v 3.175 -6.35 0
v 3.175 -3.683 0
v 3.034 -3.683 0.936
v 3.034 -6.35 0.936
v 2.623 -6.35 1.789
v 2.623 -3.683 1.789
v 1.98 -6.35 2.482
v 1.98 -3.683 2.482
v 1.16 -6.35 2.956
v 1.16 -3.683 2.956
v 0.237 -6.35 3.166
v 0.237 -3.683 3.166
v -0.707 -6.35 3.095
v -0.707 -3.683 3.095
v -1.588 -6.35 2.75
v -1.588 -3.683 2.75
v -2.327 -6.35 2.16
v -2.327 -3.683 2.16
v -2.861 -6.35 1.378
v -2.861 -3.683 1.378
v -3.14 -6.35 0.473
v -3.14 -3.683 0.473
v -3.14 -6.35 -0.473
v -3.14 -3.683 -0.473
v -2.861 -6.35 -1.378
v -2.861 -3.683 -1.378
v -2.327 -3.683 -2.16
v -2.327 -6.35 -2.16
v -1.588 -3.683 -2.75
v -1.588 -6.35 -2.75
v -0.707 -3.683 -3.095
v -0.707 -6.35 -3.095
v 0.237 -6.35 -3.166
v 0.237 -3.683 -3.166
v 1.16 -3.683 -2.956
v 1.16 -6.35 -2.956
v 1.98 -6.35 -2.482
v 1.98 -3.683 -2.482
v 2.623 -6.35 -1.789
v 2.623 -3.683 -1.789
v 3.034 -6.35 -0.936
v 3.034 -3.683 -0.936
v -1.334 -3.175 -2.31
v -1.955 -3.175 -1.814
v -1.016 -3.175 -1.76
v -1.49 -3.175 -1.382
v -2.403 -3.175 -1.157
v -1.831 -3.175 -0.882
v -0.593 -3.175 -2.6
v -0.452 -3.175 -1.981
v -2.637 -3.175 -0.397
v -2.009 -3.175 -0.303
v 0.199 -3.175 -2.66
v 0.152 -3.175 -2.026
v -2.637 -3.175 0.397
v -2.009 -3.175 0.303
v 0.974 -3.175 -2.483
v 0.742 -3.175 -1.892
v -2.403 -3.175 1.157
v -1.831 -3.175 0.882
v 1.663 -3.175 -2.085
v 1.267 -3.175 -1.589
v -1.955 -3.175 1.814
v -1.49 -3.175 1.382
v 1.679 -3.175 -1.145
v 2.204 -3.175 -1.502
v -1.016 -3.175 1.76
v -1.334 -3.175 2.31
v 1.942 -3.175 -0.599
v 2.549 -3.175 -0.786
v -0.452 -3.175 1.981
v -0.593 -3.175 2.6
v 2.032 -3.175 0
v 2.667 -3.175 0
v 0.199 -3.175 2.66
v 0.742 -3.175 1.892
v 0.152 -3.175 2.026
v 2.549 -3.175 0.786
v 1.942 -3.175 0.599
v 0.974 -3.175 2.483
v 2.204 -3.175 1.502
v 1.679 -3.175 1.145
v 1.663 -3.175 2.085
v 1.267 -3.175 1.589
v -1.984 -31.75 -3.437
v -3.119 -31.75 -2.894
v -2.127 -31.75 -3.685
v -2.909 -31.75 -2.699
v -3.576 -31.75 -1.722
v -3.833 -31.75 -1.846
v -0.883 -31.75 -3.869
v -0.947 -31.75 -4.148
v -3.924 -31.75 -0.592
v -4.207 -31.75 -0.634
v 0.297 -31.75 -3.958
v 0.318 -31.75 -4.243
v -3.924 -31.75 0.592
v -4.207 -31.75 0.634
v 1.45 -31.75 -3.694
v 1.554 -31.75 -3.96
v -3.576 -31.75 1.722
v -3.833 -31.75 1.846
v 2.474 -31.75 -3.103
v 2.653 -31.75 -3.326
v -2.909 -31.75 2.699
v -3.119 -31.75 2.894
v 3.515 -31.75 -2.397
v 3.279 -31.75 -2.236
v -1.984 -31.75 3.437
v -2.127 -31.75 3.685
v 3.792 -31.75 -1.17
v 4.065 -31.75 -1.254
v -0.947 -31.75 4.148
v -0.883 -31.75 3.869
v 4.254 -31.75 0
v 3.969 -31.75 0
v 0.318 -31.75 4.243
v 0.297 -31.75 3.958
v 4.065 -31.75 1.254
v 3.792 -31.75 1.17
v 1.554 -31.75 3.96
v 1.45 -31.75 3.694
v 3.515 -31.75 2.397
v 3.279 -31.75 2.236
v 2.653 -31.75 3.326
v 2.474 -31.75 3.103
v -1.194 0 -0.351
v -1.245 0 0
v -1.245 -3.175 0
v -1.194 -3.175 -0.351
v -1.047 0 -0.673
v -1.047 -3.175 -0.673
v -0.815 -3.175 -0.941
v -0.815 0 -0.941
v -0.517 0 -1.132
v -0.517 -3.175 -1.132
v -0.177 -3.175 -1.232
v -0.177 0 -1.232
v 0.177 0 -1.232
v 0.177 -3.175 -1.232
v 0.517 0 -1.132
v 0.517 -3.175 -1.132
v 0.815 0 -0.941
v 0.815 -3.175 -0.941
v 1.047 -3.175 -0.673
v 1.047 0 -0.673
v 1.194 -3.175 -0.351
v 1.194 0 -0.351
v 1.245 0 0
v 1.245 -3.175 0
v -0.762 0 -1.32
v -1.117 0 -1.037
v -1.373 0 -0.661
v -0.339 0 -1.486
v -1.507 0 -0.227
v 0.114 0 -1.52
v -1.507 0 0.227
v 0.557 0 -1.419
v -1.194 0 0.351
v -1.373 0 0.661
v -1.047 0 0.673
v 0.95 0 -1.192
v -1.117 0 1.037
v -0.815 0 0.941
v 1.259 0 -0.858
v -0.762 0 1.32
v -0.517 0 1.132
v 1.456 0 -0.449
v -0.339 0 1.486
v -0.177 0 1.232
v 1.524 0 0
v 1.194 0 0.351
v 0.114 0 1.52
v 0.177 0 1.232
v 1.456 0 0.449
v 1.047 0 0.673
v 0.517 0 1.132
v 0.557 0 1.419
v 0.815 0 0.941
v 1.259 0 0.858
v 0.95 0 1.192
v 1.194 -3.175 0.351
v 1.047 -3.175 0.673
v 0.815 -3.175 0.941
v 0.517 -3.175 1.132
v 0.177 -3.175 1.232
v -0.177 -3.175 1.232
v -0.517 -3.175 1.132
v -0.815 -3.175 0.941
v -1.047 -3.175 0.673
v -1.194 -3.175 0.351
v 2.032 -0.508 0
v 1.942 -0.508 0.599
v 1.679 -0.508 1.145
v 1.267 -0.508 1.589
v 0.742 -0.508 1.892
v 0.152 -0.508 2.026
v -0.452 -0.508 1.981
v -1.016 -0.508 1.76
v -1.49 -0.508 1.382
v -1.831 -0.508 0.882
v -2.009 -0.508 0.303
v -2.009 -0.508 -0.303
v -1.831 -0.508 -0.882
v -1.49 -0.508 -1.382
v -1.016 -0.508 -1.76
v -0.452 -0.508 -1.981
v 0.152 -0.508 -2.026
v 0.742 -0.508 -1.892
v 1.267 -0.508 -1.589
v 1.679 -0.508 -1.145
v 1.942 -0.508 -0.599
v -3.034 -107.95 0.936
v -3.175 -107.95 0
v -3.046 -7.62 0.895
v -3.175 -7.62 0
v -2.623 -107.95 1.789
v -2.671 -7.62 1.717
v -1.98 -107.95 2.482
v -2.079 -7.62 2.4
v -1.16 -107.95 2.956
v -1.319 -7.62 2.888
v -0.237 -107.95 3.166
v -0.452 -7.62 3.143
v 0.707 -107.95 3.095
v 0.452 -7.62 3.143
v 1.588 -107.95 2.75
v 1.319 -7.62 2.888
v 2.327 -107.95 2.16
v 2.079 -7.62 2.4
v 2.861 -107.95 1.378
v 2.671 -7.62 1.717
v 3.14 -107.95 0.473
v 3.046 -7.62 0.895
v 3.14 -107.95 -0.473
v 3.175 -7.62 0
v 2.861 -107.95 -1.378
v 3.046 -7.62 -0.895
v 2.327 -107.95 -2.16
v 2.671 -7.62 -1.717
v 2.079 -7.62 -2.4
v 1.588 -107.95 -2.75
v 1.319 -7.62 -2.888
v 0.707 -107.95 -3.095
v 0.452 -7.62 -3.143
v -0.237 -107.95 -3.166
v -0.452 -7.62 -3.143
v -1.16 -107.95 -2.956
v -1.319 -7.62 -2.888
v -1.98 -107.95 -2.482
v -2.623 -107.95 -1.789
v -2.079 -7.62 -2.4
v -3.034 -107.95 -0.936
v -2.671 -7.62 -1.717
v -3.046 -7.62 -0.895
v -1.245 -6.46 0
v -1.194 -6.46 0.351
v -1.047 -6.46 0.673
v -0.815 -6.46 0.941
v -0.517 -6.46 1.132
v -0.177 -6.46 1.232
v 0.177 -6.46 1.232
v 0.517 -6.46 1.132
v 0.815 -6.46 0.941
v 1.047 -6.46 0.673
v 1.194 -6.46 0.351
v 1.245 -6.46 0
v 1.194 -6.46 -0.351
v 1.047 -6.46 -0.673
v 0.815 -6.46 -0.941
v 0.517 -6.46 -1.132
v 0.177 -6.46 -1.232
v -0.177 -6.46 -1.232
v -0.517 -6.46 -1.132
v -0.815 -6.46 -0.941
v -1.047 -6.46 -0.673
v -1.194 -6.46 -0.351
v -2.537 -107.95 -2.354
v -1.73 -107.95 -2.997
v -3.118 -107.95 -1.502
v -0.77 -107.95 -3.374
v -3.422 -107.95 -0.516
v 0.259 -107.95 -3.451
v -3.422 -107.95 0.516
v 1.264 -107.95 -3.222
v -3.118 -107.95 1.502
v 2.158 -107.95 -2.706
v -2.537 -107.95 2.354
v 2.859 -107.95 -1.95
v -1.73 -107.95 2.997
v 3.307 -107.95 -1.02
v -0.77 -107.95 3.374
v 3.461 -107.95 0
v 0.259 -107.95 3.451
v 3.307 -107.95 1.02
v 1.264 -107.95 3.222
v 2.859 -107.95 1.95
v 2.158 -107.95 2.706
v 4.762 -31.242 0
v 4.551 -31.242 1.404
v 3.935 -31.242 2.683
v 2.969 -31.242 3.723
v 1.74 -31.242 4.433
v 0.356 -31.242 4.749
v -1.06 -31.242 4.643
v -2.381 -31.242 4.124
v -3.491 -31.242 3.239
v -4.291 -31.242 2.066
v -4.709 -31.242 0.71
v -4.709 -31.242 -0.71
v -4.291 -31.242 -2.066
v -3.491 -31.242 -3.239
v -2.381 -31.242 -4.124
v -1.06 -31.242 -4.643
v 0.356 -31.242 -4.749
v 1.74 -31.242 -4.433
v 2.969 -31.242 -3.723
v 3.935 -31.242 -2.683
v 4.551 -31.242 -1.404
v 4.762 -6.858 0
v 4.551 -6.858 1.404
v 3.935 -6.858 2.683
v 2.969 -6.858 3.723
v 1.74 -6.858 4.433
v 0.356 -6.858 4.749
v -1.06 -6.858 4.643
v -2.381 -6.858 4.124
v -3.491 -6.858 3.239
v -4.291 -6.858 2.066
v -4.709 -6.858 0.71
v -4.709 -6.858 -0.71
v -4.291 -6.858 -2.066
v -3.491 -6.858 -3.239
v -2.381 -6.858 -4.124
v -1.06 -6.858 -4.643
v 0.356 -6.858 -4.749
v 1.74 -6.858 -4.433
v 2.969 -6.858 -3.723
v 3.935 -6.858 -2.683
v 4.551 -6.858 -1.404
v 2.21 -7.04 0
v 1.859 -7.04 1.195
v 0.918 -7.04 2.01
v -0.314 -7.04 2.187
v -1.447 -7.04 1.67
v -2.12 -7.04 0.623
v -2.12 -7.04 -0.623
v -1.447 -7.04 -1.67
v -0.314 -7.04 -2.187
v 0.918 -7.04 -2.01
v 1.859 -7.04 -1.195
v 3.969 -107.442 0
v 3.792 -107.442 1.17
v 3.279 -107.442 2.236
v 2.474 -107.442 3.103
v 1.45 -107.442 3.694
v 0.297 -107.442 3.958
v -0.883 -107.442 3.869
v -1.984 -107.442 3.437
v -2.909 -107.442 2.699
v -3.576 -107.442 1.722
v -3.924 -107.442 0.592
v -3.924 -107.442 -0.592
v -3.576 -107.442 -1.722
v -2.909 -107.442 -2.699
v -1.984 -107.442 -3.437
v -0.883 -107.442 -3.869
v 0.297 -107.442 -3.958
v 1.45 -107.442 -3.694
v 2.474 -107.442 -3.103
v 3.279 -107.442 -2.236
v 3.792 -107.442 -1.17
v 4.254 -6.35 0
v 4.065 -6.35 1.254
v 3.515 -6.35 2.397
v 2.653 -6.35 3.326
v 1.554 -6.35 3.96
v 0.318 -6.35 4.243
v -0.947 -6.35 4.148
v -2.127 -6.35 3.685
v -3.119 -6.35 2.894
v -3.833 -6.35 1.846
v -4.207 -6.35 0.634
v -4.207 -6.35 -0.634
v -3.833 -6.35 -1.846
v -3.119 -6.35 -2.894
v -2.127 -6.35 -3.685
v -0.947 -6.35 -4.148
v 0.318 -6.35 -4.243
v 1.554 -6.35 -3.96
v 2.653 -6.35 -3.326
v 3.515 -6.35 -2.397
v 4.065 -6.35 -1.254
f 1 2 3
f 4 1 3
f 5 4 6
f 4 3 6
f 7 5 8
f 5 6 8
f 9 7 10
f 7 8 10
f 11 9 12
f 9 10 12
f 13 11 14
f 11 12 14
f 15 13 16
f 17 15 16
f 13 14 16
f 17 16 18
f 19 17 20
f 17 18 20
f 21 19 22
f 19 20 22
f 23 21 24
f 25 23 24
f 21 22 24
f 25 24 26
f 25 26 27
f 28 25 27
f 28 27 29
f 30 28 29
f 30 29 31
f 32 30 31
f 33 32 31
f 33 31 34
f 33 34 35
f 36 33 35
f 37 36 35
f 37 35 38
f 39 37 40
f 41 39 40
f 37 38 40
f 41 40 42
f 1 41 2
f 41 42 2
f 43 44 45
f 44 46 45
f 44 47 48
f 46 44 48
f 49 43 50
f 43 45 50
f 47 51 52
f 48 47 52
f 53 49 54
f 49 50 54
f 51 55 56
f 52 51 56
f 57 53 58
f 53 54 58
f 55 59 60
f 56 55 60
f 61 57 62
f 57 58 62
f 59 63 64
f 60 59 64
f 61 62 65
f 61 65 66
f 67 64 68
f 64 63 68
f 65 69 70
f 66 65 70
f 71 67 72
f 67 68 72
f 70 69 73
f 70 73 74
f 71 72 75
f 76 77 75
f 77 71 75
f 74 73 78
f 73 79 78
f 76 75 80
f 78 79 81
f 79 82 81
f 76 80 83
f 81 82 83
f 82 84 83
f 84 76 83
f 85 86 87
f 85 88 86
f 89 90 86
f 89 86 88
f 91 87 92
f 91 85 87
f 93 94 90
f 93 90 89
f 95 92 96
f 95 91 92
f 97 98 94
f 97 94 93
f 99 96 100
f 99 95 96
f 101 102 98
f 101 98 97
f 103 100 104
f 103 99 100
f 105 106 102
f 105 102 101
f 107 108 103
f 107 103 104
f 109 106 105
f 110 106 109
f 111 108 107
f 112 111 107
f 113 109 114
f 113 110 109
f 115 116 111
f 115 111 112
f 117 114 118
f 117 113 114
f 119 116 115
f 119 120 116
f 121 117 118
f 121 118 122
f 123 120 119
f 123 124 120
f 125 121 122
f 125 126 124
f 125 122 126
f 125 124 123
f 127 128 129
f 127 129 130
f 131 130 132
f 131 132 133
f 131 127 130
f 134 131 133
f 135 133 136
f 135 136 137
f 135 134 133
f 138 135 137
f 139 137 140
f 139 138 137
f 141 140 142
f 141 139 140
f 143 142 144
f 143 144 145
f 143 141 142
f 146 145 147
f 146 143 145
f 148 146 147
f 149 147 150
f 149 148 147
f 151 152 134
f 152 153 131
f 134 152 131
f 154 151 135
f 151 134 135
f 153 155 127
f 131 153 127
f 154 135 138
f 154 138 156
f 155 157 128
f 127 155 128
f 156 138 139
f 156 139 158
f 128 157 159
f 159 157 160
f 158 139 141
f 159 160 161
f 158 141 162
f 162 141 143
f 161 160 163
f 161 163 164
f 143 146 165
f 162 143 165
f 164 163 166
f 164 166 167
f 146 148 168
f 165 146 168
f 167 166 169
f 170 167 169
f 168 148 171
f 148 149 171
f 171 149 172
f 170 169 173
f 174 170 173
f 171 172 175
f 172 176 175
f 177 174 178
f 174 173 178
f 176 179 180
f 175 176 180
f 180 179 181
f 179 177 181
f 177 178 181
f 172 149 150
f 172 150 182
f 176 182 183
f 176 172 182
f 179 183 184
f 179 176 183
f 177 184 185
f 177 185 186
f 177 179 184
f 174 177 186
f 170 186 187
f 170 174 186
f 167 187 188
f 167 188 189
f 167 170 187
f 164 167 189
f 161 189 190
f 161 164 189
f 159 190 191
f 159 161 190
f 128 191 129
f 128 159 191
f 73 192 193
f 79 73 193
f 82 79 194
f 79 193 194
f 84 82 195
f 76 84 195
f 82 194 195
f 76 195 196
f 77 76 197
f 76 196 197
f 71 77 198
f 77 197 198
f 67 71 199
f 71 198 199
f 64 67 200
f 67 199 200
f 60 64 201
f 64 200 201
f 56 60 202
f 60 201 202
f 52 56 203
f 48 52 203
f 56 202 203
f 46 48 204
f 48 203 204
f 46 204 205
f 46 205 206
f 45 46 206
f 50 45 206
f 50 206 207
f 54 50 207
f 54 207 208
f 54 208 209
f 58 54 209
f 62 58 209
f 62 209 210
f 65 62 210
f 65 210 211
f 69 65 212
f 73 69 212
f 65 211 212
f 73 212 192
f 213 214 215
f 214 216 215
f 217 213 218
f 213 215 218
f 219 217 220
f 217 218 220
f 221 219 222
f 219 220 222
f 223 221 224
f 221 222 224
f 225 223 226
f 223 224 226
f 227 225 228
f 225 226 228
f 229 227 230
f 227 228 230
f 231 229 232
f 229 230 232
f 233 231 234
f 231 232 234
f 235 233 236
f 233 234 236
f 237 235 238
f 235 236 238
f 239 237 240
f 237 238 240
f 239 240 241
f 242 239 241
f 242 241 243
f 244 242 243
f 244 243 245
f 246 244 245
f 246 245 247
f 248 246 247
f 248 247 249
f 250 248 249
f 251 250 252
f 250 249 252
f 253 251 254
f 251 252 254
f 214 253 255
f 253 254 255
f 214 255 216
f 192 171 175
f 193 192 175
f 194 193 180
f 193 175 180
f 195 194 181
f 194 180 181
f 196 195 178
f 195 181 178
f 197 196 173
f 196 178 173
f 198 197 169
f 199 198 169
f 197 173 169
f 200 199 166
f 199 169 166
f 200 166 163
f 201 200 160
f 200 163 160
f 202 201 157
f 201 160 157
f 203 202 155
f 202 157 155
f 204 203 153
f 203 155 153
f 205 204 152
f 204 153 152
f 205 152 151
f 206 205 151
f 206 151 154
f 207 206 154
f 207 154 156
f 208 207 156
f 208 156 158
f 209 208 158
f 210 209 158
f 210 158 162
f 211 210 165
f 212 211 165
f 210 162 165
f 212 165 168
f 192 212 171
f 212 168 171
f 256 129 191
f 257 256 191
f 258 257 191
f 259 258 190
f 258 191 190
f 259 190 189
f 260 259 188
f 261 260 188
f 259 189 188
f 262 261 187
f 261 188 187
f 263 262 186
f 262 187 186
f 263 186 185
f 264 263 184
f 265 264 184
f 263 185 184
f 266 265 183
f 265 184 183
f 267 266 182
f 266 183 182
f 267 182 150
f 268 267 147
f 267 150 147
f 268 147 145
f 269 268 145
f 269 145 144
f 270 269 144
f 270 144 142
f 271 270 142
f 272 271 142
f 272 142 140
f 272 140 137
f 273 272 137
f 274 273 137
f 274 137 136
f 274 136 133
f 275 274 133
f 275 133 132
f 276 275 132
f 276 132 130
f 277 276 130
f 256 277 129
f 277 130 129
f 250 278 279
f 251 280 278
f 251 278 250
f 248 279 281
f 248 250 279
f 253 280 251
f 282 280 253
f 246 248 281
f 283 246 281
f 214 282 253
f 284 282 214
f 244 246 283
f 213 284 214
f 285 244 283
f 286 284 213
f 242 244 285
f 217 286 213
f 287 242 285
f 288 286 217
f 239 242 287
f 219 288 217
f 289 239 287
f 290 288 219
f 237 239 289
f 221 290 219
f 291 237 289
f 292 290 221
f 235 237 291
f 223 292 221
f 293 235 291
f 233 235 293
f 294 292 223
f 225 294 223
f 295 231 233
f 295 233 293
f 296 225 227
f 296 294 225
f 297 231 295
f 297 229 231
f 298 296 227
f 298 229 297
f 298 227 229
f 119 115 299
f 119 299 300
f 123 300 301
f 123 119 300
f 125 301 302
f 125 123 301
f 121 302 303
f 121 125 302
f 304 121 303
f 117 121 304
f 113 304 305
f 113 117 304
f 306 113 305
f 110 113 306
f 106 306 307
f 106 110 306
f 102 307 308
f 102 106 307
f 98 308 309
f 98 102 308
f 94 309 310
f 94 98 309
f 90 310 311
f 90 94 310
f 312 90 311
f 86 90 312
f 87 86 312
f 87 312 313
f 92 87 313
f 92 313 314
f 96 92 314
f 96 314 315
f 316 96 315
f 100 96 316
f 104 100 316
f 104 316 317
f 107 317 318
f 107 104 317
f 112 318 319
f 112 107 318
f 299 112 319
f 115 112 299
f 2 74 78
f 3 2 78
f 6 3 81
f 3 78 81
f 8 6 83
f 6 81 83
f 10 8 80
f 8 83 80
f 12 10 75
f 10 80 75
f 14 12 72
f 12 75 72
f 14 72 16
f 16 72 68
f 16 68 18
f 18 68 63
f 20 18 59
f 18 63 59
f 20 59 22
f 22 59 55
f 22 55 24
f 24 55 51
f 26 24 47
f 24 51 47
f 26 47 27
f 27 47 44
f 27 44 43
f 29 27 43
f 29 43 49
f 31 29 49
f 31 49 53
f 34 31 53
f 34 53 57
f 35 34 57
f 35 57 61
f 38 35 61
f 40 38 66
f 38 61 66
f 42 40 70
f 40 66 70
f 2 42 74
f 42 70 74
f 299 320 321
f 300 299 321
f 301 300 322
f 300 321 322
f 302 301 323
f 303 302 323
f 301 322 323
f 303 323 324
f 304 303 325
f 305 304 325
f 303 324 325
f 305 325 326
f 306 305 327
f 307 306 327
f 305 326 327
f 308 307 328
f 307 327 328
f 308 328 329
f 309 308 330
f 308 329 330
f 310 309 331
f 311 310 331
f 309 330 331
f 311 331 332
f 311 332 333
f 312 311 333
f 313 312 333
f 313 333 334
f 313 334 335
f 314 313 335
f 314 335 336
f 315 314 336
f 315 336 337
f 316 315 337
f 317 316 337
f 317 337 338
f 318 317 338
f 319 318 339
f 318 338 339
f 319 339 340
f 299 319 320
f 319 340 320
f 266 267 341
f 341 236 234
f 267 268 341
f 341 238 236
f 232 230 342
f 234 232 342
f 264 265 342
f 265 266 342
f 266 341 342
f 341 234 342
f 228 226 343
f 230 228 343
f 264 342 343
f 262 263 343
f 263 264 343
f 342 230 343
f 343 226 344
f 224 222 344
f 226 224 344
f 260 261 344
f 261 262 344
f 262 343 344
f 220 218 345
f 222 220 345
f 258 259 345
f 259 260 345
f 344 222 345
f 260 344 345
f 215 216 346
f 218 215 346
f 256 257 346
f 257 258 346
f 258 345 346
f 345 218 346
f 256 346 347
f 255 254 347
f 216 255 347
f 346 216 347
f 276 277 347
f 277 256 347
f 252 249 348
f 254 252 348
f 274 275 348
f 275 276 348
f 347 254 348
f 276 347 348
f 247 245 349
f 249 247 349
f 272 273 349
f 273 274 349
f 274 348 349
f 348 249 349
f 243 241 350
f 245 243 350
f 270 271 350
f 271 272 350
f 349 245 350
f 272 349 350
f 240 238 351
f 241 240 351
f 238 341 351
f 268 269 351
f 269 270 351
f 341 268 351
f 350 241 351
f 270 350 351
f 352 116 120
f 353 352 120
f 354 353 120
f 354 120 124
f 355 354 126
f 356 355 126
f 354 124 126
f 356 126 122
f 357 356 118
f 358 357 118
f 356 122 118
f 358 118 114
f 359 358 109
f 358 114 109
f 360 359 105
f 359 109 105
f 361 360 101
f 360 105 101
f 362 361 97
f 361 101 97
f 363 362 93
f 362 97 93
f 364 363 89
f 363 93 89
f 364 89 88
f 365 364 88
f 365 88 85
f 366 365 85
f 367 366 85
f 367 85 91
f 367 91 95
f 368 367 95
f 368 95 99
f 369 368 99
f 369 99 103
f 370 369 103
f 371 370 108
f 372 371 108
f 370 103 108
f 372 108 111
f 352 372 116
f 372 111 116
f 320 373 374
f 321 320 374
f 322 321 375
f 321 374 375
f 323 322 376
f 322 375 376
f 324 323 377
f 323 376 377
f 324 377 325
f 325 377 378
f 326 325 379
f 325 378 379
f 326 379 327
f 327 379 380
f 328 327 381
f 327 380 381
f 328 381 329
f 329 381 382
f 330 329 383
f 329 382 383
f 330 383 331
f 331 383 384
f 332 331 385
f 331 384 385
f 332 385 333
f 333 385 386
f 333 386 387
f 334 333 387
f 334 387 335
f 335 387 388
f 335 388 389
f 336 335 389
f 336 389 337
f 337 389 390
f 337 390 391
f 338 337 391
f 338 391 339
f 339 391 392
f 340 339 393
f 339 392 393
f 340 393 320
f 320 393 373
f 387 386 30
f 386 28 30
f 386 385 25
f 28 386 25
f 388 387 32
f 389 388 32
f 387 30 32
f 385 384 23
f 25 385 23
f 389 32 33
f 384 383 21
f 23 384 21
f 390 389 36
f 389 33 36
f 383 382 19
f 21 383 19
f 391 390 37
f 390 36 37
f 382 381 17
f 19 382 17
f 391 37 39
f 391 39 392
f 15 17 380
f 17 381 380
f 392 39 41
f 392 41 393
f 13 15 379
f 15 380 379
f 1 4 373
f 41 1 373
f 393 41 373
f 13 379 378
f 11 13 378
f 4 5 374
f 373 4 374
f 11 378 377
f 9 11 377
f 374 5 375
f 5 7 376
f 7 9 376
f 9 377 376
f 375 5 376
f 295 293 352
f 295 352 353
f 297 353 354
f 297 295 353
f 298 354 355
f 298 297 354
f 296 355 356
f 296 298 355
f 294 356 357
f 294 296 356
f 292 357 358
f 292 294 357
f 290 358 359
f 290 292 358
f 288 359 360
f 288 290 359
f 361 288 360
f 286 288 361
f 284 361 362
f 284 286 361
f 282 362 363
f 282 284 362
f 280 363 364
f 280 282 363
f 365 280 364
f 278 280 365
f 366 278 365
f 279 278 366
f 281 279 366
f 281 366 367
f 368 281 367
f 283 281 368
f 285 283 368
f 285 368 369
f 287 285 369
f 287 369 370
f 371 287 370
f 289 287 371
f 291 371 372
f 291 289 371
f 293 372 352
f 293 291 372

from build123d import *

# Parameters (mm, degrees)
F0_R     = 2.032
F0_R_2   = 1.2446
F1_DEPTH = 3.175
F2_R     = 3.175
F3_DEPTH = 3.175
F4_R     = 4.7625
F5_DEPTH = 25.4
F6_R     = 3.96875
F7_DEPTH = 76.2
F9_D     = 6.35
F9_DEPTH = 100.33
F9_TIP   = 1.9077324654
F10_D    = 2.4892
F11_SIZE = 0.508


with BuildPart() as f1:
    # F0 (on Front) → F1 (new body)
    with BuildSketch(Plane.XZ):
        Circle(F0_R)
        Circle(F0_R_2, mode=Mode.SUBTRACT)
    extrude(amount=F1_DEPTH)

    # F2 (on face) → F3 (join)
    with BuildSketch(Plane.XZ.offset(3.175)):
        Circle(F2_R)
    extrude(amount=F3_DEPTH)

    # F4 (on face) → F5 (join)
    with BuildSketch(Plane.XZ.offset(6.35)):
        Circle(F4_R)
    extrude(amount=F5_DEPTH)

    # F6 (on face) → F7 (join)
    with BuildSketch(Plane.XZ.offset(31.75)):
        Circle(F6_R)
    extrude(amount=F7_DEPTH)

    # F9
    with Locations(Plane.XZ.offset(107.95)):
        with Locations((0, 0)):
            Hole(F9_D / 2, depth=F9_DEPTH)
            with Locations((0, 0, -(F9_DEPTH + F9_TIP / 2))):  # 118° drill point
                Cone(0, F9_D / 2, F9_TIP, mode=Mode.SUBTRACT)

    # F10 (through all)
    with Locations(Plane.XZ.offset(107.95)):
        with Locations((0, 0)):
            Hole(F10_D / 2)

    # F11
    f11_edges = [f1.edges().sort_by_distance(p)[0] for p in [
        (-2.032, 0, 0),
        (-3.175, -3.175, 0),
        (-4.7625, -6.35, 0),
        (-4.7625, -31.75, 0),
        (-3.96875, -107.95, 0),
    ]]
    chamfer(f11_edges, length=F11_SIZE)


solid = f1.part
